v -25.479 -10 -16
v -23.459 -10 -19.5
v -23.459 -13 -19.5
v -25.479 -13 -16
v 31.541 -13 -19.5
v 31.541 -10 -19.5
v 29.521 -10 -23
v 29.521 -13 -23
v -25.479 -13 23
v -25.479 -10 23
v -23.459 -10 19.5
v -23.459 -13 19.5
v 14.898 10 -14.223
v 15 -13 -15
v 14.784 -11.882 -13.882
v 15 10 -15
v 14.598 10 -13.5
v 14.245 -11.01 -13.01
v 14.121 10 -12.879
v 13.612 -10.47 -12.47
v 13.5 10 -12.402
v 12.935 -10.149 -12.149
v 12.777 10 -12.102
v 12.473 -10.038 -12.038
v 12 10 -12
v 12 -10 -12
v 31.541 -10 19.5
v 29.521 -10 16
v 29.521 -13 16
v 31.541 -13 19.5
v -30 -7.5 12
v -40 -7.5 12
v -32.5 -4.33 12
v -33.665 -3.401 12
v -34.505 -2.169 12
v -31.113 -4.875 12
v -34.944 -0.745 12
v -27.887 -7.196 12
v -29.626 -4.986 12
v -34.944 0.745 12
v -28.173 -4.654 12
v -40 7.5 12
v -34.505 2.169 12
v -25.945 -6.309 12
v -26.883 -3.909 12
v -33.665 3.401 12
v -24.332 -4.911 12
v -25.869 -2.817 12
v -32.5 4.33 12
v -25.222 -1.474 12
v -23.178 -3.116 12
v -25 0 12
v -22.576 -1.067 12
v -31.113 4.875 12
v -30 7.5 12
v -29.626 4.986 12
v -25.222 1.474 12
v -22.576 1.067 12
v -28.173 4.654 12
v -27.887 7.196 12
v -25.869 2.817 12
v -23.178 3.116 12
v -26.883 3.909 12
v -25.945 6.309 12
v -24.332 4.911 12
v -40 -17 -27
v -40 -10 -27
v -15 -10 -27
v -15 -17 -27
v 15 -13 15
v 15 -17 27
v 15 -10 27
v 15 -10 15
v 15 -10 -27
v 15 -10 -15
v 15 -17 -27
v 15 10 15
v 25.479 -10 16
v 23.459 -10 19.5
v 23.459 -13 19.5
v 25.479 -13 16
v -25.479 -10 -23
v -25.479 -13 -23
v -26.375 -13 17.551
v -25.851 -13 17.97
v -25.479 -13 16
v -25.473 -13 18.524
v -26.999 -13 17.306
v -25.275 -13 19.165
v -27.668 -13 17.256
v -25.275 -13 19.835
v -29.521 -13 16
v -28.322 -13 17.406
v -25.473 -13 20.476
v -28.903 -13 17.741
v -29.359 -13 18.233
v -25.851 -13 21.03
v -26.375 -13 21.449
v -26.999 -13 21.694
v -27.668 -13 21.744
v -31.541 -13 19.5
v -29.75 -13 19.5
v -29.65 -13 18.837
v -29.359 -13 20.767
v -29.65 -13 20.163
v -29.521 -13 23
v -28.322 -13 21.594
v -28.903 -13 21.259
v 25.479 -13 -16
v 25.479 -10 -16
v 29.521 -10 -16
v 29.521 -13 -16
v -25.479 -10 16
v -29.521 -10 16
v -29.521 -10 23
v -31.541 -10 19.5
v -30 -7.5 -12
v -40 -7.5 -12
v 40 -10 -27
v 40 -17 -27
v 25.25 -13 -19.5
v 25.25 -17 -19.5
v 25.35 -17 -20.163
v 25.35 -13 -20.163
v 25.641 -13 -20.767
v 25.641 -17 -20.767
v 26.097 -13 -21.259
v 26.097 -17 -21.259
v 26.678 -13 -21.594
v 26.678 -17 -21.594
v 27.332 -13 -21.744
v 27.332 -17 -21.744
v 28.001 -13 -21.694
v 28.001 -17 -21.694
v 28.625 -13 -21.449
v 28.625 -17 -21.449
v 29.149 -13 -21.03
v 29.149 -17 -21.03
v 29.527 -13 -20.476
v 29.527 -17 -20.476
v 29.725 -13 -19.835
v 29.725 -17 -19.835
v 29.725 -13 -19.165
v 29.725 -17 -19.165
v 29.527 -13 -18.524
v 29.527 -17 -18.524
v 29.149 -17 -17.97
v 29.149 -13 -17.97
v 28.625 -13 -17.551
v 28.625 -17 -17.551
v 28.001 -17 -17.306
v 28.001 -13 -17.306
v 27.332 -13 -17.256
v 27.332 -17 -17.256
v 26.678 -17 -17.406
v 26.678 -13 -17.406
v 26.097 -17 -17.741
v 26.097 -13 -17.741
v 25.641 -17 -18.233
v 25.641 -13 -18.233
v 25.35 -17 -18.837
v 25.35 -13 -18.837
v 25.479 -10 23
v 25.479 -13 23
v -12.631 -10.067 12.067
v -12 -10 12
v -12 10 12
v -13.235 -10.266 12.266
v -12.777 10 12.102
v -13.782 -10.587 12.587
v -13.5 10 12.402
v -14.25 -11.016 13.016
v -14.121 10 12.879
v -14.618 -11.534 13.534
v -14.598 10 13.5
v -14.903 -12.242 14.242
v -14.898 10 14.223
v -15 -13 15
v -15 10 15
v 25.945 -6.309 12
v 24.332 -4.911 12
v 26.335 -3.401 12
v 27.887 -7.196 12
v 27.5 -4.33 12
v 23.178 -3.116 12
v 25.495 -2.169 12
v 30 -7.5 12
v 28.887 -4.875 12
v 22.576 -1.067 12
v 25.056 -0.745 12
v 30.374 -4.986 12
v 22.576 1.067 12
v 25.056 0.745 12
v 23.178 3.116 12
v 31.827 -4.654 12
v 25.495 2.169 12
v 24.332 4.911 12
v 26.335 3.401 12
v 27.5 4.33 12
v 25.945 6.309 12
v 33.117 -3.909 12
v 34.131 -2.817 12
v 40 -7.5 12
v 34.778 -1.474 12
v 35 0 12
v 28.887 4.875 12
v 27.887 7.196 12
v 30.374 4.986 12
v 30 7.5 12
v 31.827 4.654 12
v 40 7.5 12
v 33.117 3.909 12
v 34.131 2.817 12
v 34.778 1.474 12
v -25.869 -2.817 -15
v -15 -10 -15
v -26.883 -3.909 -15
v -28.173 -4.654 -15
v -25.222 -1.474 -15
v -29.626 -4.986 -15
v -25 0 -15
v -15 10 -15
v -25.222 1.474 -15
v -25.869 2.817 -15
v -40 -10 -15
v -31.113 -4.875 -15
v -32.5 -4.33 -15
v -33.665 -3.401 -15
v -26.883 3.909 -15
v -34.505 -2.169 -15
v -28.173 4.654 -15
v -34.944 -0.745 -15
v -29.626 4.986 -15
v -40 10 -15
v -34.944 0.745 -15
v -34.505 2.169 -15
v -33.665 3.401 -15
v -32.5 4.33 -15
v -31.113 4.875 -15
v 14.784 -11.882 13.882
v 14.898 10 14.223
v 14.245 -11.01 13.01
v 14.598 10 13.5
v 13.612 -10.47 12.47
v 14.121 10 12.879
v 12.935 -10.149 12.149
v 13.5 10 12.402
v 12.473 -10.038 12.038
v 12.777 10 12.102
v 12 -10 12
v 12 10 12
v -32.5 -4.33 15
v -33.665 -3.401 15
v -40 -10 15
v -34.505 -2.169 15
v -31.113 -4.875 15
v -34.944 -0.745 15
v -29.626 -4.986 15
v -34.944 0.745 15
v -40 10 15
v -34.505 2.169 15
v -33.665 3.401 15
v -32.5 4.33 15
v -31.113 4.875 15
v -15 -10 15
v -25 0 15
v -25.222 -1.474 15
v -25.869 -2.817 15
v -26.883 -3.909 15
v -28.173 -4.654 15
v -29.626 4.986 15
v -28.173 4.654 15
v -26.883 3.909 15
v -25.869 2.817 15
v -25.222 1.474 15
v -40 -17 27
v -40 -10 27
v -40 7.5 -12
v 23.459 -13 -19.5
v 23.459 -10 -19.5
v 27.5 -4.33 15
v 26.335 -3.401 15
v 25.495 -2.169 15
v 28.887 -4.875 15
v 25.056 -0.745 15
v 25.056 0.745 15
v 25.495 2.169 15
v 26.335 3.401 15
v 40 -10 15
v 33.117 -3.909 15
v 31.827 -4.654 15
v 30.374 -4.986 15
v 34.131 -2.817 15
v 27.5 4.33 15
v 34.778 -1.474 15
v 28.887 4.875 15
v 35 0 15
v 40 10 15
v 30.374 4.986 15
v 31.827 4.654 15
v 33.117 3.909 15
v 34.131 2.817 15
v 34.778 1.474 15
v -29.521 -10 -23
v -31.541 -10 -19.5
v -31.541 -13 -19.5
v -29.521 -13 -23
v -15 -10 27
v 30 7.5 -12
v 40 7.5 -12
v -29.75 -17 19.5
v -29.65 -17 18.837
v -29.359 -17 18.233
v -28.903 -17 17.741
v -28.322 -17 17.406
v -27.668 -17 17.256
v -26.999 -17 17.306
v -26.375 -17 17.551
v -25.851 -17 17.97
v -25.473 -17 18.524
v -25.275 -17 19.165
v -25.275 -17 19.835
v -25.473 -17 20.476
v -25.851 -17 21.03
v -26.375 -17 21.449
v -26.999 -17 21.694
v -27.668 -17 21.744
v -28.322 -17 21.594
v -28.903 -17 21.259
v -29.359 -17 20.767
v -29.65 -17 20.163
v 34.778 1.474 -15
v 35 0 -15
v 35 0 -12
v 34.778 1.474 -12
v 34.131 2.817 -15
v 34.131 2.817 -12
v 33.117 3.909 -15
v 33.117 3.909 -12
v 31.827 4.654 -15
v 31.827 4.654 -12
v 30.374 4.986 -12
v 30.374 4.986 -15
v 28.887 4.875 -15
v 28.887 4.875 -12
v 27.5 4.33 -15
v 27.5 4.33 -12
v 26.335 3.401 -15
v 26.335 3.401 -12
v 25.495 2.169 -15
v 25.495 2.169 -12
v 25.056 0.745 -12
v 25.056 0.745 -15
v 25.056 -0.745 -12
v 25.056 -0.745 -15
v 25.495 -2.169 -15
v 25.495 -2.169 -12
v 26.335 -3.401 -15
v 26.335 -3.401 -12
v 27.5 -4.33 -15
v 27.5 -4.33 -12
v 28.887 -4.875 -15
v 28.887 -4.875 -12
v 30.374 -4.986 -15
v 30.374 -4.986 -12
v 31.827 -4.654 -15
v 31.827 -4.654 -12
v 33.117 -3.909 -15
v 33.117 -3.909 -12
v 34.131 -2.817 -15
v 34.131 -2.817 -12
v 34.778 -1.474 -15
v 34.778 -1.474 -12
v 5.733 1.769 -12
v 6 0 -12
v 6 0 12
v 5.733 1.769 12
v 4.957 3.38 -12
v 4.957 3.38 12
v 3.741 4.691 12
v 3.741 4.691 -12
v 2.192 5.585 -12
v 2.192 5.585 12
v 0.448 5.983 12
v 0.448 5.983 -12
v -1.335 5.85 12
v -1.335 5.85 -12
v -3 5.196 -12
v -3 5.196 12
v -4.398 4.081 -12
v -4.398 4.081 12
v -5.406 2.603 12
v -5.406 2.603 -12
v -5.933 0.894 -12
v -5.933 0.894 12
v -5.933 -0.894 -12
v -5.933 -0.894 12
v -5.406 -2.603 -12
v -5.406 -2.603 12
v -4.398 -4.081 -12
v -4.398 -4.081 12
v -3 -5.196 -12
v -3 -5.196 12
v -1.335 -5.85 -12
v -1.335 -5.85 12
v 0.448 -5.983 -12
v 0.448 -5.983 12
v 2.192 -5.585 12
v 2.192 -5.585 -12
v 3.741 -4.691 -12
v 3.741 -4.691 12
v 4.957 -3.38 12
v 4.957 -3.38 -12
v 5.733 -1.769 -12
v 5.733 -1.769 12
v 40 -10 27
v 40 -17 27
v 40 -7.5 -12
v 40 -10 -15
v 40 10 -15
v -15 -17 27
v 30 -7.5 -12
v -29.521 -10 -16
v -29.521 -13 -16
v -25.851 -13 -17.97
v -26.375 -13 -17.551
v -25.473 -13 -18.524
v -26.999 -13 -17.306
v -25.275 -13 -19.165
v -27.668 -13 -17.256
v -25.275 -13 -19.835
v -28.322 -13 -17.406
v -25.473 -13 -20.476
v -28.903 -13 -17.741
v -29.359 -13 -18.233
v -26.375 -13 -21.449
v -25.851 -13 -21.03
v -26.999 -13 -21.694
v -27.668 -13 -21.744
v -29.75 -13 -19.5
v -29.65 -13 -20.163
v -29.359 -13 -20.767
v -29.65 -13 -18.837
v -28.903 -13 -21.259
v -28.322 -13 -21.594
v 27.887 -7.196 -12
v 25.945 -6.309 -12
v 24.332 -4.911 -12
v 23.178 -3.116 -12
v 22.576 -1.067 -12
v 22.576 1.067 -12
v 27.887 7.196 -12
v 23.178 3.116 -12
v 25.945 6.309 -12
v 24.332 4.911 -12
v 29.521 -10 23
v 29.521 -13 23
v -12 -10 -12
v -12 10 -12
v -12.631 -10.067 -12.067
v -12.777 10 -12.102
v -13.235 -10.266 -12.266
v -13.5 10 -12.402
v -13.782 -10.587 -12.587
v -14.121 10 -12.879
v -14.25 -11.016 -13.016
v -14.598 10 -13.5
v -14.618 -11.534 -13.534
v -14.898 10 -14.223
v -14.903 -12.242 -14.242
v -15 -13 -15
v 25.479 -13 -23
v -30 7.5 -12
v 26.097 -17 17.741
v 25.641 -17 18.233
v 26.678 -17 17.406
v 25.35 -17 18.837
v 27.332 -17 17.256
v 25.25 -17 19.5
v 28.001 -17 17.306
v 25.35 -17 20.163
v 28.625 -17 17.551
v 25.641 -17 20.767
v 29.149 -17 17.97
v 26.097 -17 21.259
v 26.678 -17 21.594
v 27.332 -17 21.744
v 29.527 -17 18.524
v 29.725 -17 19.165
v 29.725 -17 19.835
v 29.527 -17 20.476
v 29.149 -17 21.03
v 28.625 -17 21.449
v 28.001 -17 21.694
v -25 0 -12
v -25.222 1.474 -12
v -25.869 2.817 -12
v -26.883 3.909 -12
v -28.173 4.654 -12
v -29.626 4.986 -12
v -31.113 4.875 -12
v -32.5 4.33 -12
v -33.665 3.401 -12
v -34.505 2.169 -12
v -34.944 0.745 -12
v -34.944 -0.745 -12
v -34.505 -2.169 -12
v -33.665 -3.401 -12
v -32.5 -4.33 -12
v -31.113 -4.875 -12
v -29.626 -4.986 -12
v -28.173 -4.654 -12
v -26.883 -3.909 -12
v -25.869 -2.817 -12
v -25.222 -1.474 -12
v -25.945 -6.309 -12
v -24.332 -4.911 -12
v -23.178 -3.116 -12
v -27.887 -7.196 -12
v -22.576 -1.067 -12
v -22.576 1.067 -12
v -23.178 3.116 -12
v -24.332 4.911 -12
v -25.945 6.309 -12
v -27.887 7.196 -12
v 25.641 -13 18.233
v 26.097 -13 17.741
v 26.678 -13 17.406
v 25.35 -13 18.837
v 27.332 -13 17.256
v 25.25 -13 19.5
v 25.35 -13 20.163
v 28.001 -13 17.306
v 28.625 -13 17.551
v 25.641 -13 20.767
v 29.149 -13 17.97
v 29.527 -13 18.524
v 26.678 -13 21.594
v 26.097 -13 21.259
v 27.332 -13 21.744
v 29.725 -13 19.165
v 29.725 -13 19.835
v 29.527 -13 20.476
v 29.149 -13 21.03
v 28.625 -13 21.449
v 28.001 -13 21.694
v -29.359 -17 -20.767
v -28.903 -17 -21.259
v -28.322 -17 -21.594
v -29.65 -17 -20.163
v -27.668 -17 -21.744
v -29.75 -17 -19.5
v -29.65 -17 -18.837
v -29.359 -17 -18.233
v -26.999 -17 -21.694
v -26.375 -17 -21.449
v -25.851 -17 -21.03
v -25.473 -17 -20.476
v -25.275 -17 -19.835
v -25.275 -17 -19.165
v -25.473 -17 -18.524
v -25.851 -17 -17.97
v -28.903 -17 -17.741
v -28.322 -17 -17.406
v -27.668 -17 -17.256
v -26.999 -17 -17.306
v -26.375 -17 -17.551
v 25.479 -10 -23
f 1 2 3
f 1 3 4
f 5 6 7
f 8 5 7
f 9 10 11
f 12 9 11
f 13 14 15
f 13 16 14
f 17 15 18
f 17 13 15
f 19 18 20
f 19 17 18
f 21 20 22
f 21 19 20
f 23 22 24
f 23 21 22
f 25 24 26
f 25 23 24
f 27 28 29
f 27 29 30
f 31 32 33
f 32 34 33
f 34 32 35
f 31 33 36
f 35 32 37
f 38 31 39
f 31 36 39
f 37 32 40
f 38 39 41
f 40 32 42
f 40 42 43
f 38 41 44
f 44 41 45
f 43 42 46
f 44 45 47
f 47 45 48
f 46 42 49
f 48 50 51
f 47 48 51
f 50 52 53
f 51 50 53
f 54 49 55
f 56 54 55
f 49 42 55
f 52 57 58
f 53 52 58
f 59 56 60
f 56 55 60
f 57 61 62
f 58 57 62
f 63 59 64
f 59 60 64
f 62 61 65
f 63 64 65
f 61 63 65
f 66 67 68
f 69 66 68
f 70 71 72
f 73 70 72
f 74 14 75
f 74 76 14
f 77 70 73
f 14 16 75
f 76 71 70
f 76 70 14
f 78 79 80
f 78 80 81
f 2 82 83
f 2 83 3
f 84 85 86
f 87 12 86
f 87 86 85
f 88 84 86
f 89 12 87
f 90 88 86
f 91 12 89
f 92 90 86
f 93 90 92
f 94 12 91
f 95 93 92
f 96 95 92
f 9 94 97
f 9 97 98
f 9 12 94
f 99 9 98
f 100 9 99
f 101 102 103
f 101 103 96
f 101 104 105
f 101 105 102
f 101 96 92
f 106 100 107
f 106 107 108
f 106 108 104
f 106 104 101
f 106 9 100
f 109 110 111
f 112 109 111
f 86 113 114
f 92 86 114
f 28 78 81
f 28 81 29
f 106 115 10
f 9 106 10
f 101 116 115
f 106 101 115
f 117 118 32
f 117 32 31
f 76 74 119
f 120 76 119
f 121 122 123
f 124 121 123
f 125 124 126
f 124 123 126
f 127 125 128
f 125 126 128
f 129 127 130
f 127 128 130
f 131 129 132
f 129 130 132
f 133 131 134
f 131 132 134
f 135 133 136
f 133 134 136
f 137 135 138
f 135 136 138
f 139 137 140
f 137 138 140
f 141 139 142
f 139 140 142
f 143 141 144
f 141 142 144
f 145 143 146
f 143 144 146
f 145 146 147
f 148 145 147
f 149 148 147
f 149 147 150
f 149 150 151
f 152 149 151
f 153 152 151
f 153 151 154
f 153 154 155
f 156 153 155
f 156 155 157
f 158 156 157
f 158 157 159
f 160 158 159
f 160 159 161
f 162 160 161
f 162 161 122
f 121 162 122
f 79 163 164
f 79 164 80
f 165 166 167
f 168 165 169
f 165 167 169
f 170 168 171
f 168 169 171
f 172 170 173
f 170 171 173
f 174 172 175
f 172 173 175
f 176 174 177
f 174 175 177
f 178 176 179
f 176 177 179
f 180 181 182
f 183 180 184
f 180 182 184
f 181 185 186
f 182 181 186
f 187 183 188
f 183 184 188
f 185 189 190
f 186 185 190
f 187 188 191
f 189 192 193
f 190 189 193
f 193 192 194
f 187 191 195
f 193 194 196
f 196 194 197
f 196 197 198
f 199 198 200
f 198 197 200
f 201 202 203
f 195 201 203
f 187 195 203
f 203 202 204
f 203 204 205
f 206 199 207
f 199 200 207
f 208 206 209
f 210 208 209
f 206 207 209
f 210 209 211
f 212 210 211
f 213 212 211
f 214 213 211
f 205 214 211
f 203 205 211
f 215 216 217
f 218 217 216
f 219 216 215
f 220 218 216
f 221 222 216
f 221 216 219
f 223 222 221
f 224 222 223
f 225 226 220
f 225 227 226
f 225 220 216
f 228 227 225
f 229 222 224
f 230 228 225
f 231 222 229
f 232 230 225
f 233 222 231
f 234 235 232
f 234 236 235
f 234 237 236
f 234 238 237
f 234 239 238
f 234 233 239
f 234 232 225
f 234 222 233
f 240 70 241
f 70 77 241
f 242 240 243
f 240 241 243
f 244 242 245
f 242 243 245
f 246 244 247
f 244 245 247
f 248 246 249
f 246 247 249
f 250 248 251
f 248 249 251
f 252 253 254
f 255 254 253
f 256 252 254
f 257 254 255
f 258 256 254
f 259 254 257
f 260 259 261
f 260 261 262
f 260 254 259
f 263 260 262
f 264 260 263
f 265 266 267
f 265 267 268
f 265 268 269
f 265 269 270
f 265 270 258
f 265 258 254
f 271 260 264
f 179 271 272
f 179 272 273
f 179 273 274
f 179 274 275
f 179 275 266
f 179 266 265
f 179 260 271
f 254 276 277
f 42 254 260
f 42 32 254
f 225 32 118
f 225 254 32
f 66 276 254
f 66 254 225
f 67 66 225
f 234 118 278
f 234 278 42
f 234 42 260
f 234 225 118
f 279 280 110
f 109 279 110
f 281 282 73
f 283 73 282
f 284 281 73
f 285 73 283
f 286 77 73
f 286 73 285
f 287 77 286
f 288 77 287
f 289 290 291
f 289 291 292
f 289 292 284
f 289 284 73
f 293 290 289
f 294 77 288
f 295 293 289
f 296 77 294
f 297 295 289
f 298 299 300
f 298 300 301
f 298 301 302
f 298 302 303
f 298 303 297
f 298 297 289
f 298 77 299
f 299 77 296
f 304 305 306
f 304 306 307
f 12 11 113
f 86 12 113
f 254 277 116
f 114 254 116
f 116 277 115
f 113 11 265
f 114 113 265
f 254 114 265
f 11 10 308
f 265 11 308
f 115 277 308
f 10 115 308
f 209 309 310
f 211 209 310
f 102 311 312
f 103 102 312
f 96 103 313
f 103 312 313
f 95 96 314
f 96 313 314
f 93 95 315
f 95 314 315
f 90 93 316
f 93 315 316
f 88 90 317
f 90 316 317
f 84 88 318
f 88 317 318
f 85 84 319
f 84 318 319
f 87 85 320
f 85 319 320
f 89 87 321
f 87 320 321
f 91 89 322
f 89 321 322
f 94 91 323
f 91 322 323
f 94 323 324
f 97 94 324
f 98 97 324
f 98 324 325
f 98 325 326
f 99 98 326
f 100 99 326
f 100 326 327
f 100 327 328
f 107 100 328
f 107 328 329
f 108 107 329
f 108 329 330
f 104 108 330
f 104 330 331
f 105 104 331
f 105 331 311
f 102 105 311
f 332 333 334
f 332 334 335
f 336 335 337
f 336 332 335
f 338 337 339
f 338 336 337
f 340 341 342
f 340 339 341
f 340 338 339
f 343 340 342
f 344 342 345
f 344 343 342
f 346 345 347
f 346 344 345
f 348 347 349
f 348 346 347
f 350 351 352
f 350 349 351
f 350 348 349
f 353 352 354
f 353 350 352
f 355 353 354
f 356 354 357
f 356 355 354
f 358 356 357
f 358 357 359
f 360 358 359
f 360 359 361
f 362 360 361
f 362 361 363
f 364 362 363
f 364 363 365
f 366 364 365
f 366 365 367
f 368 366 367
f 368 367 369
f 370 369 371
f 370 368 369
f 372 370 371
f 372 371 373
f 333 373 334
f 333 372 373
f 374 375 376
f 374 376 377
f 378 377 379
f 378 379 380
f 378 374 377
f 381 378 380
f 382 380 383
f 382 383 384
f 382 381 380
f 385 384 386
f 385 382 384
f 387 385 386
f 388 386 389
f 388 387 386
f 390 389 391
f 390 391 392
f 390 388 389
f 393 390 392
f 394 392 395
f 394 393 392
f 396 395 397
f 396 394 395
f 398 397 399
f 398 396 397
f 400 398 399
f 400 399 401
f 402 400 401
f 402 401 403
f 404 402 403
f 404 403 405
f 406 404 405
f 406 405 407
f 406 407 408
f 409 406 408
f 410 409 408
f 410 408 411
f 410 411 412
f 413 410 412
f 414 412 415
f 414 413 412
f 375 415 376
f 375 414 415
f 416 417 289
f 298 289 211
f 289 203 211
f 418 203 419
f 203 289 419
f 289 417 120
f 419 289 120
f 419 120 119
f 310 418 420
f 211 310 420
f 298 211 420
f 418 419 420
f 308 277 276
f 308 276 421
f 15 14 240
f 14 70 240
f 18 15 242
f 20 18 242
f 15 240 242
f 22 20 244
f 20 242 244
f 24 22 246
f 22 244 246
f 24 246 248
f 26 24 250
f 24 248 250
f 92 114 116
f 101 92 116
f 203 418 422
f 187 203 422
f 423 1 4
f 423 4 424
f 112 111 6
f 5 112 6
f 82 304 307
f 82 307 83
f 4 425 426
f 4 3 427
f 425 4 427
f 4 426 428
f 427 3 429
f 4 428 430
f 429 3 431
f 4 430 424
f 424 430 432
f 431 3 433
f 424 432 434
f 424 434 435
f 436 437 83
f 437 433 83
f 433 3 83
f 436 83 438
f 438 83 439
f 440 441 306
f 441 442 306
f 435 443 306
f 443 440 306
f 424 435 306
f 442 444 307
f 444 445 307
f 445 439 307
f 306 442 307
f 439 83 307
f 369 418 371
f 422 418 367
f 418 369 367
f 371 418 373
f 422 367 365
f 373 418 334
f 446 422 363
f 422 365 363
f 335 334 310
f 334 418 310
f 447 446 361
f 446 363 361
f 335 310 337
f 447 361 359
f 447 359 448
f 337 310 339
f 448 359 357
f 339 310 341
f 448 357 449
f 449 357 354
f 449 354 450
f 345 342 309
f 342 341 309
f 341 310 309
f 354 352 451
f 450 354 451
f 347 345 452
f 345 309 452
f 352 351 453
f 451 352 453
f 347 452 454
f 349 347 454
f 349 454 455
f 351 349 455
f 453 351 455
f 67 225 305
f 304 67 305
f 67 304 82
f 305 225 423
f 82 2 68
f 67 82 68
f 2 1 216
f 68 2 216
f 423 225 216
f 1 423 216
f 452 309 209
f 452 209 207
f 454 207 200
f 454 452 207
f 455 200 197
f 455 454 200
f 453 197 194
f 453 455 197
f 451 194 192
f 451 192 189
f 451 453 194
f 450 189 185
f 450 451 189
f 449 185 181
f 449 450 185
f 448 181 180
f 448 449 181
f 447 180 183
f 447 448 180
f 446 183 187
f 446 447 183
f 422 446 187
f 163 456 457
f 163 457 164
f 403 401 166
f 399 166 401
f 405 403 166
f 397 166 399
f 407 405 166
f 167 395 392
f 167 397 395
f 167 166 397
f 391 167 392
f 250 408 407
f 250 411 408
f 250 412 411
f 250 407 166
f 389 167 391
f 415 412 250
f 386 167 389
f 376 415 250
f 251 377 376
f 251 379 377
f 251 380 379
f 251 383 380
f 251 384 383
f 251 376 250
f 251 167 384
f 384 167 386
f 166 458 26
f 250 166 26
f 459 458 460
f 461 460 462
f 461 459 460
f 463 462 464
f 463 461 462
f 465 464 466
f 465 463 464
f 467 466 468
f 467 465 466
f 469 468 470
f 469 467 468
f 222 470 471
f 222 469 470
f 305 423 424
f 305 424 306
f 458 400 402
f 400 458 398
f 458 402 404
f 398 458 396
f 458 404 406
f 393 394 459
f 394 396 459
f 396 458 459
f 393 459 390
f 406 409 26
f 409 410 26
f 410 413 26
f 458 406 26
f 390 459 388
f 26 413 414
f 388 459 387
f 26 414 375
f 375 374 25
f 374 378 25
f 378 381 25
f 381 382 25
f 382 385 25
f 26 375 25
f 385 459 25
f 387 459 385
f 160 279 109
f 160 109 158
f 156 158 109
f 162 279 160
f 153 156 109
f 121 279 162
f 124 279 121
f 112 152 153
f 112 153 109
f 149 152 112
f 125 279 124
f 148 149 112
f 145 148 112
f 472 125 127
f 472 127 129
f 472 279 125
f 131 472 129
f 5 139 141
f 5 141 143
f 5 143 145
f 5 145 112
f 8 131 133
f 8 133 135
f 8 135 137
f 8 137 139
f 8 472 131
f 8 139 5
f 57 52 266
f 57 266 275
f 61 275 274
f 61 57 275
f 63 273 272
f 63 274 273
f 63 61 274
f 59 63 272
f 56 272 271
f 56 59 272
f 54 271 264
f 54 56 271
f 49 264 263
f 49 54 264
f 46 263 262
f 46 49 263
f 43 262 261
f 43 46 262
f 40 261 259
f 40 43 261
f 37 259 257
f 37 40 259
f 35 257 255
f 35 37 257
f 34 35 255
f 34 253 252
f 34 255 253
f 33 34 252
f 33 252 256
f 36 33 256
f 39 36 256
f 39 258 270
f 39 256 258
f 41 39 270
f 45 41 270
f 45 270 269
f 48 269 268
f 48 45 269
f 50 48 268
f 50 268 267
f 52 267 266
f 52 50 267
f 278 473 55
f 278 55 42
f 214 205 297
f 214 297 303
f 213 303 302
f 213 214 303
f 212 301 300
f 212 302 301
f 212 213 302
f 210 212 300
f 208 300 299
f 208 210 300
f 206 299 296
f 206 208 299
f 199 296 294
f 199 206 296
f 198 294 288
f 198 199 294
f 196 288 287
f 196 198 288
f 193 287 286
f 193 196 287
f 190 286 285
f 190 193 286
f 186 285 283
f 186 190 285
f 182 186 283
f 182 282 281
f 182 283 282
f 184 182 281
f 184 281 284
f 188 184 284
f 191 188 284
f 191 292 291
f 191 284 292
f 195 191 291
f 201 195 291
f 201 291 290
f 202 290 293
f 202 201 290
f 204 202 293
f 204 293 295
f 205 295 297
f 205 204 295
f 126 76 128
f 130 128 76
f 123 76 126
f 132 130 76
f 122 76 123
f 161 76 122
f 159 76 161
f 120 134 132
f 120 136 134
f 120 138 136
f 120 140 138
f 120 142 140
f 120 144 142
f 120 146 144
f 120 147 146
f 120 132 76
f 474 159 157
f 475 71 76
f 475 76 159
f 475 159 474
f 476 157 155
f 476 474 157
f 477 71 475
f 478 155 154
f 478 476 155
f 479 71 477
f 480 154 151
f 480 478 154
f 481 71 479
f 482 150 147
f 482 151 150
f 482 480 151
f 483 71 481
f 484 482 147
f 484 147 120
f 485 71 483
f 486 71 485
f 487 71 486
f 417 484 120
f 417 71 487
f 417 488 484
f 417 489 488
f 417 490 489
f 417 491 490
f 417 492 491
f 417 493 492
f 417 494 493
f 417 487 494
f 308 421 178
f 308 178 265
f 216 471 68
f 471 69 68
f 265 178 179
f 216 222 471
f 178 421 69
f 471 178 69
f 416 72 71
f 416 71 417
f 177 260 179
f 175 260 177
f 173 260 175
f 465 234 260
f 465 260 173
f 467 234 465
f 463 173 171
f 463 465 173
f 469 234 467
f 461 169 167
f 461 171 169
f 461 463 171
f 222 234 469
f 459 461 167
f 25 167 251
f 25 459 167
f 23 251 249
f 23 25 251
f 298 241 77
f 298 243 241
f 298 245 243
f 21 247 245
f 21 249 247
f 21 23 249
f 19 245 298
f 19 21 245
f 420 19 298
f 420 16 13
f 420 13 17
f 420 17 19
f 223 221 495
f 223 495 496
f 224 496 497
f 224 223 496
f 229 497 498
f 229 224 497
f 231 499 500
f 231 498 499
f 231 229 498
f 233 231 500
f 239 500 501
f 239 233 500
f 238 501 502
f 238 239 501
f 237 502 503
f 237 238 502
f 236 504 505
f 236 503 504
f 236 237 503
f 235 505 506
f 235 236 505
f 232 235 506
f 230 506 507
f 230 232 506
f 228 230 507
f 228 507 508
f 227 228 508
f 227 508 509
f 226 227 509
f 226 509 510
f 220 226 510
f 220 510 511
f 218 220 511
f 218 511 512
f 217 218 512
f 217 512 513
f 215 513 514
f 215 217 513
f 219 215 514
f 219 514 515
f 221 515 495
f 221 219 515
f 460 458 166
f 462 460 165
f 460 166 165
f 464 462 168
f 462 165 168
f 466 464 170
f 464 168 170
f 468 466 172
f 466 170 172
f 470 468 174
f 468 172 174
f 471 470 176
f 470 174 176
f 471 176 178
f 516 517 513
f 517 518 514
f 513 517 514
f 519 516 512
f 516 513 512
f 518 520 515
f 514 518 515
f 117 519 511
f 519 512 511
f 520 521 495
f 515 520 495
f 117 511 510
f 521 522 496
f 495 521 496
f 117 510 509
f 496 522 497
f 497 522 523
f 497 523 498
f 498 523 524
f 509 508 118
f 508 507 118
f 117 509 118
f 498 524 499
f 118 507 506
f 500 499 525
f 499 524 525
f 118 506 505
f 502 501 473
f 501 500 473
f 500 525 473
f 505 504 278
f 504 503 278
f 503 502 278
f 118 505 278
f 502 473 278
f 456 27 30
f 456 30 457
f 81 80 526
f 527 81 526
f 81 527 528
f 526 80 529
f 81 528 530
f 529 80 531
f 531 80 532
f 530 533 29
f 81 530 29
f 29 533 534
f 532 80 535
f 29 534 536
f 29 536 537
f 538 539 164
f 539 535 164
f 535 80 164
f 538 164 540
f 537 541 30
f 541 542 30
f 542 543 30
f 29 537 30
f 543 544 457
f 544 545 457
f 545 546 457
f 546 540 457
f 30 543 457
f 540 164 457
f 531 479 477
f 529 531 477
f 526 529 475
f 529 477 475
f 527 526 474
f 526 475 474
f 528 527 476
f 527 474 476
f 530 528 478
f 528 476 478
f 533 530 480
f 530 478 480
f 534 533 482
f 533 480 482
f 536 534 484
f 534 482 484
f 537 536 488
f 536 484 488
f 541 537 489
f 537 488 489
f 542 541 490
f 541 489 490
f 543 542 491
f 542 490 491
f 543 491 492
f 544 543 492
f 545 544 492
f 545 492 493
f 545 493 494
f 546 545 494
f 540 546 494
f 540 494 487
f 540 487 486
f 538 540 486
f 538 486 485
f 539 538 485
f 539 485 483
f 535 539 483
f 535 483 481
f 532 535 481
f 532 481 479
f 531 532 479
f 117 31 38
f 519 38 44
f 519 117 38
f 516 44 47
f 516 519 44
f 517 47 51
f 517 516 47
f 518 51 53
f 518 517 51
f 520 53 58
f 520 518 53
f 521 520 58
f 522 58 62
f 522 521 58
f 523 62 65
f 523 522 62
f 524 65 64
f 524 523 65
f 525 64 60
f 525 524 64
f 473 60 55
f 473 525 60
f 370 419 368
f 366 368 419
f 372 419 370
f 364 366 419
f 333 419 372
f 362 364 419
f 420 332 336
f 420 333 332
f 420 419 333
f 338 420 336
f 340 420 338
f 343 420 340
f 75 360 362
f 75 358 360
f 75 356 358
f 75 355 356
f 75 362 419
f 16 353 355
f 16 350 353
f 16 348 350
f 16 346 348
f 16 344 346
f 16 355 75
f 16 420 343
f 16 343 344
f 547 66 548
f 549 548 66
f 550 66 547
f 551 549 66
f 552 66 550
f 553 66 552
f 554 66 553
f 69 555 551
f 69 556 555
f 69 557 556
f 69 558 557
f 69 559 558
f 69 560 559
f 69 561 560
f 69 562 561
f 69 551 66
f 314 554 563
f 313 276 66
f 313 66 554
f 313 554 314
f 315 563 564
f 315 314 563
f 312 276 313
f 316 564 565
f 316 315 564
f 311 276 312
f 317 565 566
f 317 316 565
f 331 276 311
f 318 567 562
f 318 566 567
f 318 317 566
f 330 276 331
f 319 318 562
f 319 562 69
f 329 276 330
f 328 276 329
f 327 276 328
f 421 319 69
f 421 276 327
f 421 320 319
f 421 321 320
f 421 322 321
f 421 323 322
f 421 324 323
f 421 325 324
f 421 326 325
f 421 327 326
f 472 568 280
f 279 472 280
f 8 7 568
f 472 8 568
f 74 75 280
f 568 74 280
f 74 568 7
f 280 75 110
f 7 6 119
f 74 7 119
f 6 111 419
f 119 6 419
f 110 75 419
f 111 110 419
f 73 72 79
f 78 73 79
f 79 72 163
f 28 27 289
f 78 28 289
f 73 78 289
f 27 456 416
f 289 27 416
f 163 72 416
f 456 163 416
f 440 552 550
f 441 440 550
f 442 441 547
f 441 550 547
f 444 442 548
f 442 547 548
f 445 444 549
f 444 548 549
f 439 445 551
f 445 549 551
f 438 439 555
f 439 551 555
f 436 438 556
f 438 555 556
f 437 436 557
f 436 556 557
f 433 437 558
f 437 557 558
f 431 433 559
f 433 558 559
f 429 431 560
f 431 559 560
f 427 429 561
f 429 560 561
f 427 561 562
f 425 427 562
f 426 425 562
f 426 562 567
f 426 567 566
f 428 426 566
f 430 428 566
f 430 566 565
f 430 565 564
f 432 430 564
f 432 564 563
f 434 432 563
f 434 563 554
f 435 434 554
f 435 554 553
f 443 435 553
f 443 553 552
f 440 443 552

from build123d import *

# Parameters (mm, degrees)
BOSS_EXTRUDE1_DEPTH      = 12
BOSS_EXTRUDE1_DEPTH_BACK = 12
SKETCH1_W                = 80
SKETCH1_H                = 20
SKETCH1_R                = 6
SKETCH1_R_2              = 7.5
SKETCH2_W                = 25
SKETCH2_H                = 54
BOSS_EXTRUDE2_DEPTH      = 7
CUT_EXTRUDE1_DEPTH       = 3
MIRROR2_COPY_1_DEPTH     = 3
D_GAGEMENT_M41_D         = 4.5
CUT_EXTRUDE2_DEPTH       = 59.395205283
SKETCH7_W                = 25
SKETCH7_H                = 20
BOSS_EXTRUDE3_DEPTH      = 3
SKETCH8_W                = 25
SKETCH8_H                = 20
BOSS_EXTRUDE4_DEPTH      = 3
CUT_EXTRUDE3_DEPTH       = 59.395205283
CUT_EXTRUDE3_DEPTH_BACK  = 59.395205283
SKETCH10_R               = 5
FILLET1_R                = 3


with BuildPart() as part:
    # Sketch1 → Boss-Extrude1 (new, two sides: drawn at the far end of the back side and taken through both)
    with BuildSketch(Plane.XY.offset(-BOSS_EXTRUDE1_DEPTH_BACK)):
        Rectangle(SKETCH1_W, SKETCH1_H)
        Circle(SKETCH1_R, mode=Mode.SUBTRACT)
        with Locations((30, 0)):
            Circle(SKETCH1_R_2, mode=Mode.SUBTRACT)
        with Locations((-30, 0)):
            Circle(SKETCH1_R_2, mode=Mode.SUBTRACT)
    extrude(amount=BOSS_EXTRUDE1_DEPTH + BOSS_EXTRUDE1_DEPTH_BACK)

    # Sketch2 → Boss-Extrude2 (add)
    with BuildSketch(Plane.XZ.offset(10)):
        with Locations((27.5, 0)):
            Rectangle(SKETCH2_W, SKETCH2_H)
        with Locations((-27.5, 0)):
            Rectangle(SKETCH2_W, SKETCH2_H)
    extrude(amount=BOSS_EXTRUDE2_DEPTH)

    # Sketch3 → Cut-Extrude1 (cut)
    with BuildSketch(Plane(origin=(0, -10, 0), x_dir=(1, 0, 0), z_dir=(0, 1, 0))):
        Polygon((29.520725942, 23.000000033), (25.479274058, 23.000000033), (23.458548116, 19.500000033), (25.479274058, 16.000000033), (29.520725942, 16.000000033), (31.541451884, 19.500000033), align=None)
    cut_extrude1 = extrude(amount=-CUT_EXTRUDE1_DEPTH, mode=Mode.SUBTRACT)

    # Mirror1: Cut-Extrude1 across plane
    add(cut_extrude1.mirror(Plane(origin=(0, 0, 0), x_dir=(0, 0, 1), z_dir=(1, 0, 0))), mode=Mode.SUBTRACT)

    # Mirror2: Cut-Extrude1 across plane
    add(cut_extrude1.mirror(Plane.XY), mode=Mode.SUBTRACT)

    # Mirror2 copy 1 sketch → Mirror2 copy 1 (cut)
    with BuildSketch(Plane(origin=(0, -10, 0), x_dir=(-1, 0, 0), z_dir=(0, 1, 0))):
        Polygon((29.520725942, 23.000000033), (25.479274058, 23.000000033), (23.458548116, 19.500000033), (25.479274058, 16.000000033), (29.520725942, 16.000000033), (31.541451884, 19.500000033), align=None)
    extrude(amount=-MIRROR2_COPY_1_DEPTH, mode=Mode.SUBTRACT)

    # Dégagement M41 (through all)
    with Locations(Plane(origin=(0, -13, 0), x_dir=(1, 0, 0), z_dir=(0, 1, 0))):
        with Locations((27.5, 19.5), (27.5, -19.5), (-27.5, -19.5), (-27.5, 19.5)):
            Hole(D_GAGEMENT_M41_D / 2)

    # Sketch6 → Cut-Extrude2 (cut, through all)
    with BuildSketch(Plane(origin=(0, 0, -12), x_dir=(-1, 0, 0), z_dir=(0, 0, -1))):
        with BuildLine():
            Line((-30, 7.5), (-40, 7.5))
            Line((-40, 7.5), (-40, -7.5))
            Line((-40, -7.5), (-30, -7.5))
            ThreePointArc((-30, -7.5), (-37.5, 0), (-30, 7.5))
        make_face()
    cut_extrude2 = extrude(amount=-CUT_EXTRUDE2_DEPTH, mode=Mode.SUBTRACT)

    # Mirror3: Cut-Extrude2 across plane
    add(cut_extrude2.mirror(Plane(origin=(0, 0, 0), x_dir=(0, 0, 1), z_dir=(1, 0, 0))), mode=Mode.SUBTRACT)

    # Sketch7 → Boss-Extrude3 (add)
    with BuildSketch(Plane(origin=(0, 0, -12), x_dir=(-1, 0, 0), z_dir=(0, 0, -1))):
        with Locations((-27.5, 0)):
            Rectangle(SKETCH7_W, SKETCH7_H)
        with Locations((27.5, 0)):
            Rectangle(SKETCH7_W, SKETCH7_H)
    extrude(amount=BOSS_EXTRUDE3_DEPTH)

    # Sketch8 → Boss-Extrude4 (add)
    with BuildSketch(Plane.XY.offset(12)):
        with Locations((27.5, 0)):
            Rectangle(SKETCH8_W, SKETCH8_H)
        with Locations((-27.5, 0)):
            Rectangle(SKETCH8_W, SKETCH8_H)
    extrude(amount=BOSS_EXTRUDE4_DEPTH)

    # Sketch10 → Cut-Extrude3 (cut, two sides: drawn at the far end of the back side and taken through both)
    with BuildSketch(Plane.XY.offset(-12).offset(-CUT_EXTRUDE3_DEPTH_BACK)):
        with Locations((30, 0)):
            Circle(SKETCH10_R)
        with Locations((-30, 0)):
            Circle(SKETCH10_R)
    extrude(amount=CUT_EXTRUDE3_DEPTH + CUT_EXTRUDE3_DEPTH_BACK, mode=Mode.SUBTRACT)

    # Fillet1
    fillet1_edges = [part.edges().sort_by_distance(p)[0] for p in [
        (15, -10, 0),
        (-15, -10, 0),
        (-15, 0, -12),
        (15, 0, -12),
        (-15, 0, 12),
        (15, 0, 12),
    ]]
    fillet(fillet1_edges, radius=FILLET1_R - 0.0001)  # a hair under: the kernel refuses the full size


solid = part.part
